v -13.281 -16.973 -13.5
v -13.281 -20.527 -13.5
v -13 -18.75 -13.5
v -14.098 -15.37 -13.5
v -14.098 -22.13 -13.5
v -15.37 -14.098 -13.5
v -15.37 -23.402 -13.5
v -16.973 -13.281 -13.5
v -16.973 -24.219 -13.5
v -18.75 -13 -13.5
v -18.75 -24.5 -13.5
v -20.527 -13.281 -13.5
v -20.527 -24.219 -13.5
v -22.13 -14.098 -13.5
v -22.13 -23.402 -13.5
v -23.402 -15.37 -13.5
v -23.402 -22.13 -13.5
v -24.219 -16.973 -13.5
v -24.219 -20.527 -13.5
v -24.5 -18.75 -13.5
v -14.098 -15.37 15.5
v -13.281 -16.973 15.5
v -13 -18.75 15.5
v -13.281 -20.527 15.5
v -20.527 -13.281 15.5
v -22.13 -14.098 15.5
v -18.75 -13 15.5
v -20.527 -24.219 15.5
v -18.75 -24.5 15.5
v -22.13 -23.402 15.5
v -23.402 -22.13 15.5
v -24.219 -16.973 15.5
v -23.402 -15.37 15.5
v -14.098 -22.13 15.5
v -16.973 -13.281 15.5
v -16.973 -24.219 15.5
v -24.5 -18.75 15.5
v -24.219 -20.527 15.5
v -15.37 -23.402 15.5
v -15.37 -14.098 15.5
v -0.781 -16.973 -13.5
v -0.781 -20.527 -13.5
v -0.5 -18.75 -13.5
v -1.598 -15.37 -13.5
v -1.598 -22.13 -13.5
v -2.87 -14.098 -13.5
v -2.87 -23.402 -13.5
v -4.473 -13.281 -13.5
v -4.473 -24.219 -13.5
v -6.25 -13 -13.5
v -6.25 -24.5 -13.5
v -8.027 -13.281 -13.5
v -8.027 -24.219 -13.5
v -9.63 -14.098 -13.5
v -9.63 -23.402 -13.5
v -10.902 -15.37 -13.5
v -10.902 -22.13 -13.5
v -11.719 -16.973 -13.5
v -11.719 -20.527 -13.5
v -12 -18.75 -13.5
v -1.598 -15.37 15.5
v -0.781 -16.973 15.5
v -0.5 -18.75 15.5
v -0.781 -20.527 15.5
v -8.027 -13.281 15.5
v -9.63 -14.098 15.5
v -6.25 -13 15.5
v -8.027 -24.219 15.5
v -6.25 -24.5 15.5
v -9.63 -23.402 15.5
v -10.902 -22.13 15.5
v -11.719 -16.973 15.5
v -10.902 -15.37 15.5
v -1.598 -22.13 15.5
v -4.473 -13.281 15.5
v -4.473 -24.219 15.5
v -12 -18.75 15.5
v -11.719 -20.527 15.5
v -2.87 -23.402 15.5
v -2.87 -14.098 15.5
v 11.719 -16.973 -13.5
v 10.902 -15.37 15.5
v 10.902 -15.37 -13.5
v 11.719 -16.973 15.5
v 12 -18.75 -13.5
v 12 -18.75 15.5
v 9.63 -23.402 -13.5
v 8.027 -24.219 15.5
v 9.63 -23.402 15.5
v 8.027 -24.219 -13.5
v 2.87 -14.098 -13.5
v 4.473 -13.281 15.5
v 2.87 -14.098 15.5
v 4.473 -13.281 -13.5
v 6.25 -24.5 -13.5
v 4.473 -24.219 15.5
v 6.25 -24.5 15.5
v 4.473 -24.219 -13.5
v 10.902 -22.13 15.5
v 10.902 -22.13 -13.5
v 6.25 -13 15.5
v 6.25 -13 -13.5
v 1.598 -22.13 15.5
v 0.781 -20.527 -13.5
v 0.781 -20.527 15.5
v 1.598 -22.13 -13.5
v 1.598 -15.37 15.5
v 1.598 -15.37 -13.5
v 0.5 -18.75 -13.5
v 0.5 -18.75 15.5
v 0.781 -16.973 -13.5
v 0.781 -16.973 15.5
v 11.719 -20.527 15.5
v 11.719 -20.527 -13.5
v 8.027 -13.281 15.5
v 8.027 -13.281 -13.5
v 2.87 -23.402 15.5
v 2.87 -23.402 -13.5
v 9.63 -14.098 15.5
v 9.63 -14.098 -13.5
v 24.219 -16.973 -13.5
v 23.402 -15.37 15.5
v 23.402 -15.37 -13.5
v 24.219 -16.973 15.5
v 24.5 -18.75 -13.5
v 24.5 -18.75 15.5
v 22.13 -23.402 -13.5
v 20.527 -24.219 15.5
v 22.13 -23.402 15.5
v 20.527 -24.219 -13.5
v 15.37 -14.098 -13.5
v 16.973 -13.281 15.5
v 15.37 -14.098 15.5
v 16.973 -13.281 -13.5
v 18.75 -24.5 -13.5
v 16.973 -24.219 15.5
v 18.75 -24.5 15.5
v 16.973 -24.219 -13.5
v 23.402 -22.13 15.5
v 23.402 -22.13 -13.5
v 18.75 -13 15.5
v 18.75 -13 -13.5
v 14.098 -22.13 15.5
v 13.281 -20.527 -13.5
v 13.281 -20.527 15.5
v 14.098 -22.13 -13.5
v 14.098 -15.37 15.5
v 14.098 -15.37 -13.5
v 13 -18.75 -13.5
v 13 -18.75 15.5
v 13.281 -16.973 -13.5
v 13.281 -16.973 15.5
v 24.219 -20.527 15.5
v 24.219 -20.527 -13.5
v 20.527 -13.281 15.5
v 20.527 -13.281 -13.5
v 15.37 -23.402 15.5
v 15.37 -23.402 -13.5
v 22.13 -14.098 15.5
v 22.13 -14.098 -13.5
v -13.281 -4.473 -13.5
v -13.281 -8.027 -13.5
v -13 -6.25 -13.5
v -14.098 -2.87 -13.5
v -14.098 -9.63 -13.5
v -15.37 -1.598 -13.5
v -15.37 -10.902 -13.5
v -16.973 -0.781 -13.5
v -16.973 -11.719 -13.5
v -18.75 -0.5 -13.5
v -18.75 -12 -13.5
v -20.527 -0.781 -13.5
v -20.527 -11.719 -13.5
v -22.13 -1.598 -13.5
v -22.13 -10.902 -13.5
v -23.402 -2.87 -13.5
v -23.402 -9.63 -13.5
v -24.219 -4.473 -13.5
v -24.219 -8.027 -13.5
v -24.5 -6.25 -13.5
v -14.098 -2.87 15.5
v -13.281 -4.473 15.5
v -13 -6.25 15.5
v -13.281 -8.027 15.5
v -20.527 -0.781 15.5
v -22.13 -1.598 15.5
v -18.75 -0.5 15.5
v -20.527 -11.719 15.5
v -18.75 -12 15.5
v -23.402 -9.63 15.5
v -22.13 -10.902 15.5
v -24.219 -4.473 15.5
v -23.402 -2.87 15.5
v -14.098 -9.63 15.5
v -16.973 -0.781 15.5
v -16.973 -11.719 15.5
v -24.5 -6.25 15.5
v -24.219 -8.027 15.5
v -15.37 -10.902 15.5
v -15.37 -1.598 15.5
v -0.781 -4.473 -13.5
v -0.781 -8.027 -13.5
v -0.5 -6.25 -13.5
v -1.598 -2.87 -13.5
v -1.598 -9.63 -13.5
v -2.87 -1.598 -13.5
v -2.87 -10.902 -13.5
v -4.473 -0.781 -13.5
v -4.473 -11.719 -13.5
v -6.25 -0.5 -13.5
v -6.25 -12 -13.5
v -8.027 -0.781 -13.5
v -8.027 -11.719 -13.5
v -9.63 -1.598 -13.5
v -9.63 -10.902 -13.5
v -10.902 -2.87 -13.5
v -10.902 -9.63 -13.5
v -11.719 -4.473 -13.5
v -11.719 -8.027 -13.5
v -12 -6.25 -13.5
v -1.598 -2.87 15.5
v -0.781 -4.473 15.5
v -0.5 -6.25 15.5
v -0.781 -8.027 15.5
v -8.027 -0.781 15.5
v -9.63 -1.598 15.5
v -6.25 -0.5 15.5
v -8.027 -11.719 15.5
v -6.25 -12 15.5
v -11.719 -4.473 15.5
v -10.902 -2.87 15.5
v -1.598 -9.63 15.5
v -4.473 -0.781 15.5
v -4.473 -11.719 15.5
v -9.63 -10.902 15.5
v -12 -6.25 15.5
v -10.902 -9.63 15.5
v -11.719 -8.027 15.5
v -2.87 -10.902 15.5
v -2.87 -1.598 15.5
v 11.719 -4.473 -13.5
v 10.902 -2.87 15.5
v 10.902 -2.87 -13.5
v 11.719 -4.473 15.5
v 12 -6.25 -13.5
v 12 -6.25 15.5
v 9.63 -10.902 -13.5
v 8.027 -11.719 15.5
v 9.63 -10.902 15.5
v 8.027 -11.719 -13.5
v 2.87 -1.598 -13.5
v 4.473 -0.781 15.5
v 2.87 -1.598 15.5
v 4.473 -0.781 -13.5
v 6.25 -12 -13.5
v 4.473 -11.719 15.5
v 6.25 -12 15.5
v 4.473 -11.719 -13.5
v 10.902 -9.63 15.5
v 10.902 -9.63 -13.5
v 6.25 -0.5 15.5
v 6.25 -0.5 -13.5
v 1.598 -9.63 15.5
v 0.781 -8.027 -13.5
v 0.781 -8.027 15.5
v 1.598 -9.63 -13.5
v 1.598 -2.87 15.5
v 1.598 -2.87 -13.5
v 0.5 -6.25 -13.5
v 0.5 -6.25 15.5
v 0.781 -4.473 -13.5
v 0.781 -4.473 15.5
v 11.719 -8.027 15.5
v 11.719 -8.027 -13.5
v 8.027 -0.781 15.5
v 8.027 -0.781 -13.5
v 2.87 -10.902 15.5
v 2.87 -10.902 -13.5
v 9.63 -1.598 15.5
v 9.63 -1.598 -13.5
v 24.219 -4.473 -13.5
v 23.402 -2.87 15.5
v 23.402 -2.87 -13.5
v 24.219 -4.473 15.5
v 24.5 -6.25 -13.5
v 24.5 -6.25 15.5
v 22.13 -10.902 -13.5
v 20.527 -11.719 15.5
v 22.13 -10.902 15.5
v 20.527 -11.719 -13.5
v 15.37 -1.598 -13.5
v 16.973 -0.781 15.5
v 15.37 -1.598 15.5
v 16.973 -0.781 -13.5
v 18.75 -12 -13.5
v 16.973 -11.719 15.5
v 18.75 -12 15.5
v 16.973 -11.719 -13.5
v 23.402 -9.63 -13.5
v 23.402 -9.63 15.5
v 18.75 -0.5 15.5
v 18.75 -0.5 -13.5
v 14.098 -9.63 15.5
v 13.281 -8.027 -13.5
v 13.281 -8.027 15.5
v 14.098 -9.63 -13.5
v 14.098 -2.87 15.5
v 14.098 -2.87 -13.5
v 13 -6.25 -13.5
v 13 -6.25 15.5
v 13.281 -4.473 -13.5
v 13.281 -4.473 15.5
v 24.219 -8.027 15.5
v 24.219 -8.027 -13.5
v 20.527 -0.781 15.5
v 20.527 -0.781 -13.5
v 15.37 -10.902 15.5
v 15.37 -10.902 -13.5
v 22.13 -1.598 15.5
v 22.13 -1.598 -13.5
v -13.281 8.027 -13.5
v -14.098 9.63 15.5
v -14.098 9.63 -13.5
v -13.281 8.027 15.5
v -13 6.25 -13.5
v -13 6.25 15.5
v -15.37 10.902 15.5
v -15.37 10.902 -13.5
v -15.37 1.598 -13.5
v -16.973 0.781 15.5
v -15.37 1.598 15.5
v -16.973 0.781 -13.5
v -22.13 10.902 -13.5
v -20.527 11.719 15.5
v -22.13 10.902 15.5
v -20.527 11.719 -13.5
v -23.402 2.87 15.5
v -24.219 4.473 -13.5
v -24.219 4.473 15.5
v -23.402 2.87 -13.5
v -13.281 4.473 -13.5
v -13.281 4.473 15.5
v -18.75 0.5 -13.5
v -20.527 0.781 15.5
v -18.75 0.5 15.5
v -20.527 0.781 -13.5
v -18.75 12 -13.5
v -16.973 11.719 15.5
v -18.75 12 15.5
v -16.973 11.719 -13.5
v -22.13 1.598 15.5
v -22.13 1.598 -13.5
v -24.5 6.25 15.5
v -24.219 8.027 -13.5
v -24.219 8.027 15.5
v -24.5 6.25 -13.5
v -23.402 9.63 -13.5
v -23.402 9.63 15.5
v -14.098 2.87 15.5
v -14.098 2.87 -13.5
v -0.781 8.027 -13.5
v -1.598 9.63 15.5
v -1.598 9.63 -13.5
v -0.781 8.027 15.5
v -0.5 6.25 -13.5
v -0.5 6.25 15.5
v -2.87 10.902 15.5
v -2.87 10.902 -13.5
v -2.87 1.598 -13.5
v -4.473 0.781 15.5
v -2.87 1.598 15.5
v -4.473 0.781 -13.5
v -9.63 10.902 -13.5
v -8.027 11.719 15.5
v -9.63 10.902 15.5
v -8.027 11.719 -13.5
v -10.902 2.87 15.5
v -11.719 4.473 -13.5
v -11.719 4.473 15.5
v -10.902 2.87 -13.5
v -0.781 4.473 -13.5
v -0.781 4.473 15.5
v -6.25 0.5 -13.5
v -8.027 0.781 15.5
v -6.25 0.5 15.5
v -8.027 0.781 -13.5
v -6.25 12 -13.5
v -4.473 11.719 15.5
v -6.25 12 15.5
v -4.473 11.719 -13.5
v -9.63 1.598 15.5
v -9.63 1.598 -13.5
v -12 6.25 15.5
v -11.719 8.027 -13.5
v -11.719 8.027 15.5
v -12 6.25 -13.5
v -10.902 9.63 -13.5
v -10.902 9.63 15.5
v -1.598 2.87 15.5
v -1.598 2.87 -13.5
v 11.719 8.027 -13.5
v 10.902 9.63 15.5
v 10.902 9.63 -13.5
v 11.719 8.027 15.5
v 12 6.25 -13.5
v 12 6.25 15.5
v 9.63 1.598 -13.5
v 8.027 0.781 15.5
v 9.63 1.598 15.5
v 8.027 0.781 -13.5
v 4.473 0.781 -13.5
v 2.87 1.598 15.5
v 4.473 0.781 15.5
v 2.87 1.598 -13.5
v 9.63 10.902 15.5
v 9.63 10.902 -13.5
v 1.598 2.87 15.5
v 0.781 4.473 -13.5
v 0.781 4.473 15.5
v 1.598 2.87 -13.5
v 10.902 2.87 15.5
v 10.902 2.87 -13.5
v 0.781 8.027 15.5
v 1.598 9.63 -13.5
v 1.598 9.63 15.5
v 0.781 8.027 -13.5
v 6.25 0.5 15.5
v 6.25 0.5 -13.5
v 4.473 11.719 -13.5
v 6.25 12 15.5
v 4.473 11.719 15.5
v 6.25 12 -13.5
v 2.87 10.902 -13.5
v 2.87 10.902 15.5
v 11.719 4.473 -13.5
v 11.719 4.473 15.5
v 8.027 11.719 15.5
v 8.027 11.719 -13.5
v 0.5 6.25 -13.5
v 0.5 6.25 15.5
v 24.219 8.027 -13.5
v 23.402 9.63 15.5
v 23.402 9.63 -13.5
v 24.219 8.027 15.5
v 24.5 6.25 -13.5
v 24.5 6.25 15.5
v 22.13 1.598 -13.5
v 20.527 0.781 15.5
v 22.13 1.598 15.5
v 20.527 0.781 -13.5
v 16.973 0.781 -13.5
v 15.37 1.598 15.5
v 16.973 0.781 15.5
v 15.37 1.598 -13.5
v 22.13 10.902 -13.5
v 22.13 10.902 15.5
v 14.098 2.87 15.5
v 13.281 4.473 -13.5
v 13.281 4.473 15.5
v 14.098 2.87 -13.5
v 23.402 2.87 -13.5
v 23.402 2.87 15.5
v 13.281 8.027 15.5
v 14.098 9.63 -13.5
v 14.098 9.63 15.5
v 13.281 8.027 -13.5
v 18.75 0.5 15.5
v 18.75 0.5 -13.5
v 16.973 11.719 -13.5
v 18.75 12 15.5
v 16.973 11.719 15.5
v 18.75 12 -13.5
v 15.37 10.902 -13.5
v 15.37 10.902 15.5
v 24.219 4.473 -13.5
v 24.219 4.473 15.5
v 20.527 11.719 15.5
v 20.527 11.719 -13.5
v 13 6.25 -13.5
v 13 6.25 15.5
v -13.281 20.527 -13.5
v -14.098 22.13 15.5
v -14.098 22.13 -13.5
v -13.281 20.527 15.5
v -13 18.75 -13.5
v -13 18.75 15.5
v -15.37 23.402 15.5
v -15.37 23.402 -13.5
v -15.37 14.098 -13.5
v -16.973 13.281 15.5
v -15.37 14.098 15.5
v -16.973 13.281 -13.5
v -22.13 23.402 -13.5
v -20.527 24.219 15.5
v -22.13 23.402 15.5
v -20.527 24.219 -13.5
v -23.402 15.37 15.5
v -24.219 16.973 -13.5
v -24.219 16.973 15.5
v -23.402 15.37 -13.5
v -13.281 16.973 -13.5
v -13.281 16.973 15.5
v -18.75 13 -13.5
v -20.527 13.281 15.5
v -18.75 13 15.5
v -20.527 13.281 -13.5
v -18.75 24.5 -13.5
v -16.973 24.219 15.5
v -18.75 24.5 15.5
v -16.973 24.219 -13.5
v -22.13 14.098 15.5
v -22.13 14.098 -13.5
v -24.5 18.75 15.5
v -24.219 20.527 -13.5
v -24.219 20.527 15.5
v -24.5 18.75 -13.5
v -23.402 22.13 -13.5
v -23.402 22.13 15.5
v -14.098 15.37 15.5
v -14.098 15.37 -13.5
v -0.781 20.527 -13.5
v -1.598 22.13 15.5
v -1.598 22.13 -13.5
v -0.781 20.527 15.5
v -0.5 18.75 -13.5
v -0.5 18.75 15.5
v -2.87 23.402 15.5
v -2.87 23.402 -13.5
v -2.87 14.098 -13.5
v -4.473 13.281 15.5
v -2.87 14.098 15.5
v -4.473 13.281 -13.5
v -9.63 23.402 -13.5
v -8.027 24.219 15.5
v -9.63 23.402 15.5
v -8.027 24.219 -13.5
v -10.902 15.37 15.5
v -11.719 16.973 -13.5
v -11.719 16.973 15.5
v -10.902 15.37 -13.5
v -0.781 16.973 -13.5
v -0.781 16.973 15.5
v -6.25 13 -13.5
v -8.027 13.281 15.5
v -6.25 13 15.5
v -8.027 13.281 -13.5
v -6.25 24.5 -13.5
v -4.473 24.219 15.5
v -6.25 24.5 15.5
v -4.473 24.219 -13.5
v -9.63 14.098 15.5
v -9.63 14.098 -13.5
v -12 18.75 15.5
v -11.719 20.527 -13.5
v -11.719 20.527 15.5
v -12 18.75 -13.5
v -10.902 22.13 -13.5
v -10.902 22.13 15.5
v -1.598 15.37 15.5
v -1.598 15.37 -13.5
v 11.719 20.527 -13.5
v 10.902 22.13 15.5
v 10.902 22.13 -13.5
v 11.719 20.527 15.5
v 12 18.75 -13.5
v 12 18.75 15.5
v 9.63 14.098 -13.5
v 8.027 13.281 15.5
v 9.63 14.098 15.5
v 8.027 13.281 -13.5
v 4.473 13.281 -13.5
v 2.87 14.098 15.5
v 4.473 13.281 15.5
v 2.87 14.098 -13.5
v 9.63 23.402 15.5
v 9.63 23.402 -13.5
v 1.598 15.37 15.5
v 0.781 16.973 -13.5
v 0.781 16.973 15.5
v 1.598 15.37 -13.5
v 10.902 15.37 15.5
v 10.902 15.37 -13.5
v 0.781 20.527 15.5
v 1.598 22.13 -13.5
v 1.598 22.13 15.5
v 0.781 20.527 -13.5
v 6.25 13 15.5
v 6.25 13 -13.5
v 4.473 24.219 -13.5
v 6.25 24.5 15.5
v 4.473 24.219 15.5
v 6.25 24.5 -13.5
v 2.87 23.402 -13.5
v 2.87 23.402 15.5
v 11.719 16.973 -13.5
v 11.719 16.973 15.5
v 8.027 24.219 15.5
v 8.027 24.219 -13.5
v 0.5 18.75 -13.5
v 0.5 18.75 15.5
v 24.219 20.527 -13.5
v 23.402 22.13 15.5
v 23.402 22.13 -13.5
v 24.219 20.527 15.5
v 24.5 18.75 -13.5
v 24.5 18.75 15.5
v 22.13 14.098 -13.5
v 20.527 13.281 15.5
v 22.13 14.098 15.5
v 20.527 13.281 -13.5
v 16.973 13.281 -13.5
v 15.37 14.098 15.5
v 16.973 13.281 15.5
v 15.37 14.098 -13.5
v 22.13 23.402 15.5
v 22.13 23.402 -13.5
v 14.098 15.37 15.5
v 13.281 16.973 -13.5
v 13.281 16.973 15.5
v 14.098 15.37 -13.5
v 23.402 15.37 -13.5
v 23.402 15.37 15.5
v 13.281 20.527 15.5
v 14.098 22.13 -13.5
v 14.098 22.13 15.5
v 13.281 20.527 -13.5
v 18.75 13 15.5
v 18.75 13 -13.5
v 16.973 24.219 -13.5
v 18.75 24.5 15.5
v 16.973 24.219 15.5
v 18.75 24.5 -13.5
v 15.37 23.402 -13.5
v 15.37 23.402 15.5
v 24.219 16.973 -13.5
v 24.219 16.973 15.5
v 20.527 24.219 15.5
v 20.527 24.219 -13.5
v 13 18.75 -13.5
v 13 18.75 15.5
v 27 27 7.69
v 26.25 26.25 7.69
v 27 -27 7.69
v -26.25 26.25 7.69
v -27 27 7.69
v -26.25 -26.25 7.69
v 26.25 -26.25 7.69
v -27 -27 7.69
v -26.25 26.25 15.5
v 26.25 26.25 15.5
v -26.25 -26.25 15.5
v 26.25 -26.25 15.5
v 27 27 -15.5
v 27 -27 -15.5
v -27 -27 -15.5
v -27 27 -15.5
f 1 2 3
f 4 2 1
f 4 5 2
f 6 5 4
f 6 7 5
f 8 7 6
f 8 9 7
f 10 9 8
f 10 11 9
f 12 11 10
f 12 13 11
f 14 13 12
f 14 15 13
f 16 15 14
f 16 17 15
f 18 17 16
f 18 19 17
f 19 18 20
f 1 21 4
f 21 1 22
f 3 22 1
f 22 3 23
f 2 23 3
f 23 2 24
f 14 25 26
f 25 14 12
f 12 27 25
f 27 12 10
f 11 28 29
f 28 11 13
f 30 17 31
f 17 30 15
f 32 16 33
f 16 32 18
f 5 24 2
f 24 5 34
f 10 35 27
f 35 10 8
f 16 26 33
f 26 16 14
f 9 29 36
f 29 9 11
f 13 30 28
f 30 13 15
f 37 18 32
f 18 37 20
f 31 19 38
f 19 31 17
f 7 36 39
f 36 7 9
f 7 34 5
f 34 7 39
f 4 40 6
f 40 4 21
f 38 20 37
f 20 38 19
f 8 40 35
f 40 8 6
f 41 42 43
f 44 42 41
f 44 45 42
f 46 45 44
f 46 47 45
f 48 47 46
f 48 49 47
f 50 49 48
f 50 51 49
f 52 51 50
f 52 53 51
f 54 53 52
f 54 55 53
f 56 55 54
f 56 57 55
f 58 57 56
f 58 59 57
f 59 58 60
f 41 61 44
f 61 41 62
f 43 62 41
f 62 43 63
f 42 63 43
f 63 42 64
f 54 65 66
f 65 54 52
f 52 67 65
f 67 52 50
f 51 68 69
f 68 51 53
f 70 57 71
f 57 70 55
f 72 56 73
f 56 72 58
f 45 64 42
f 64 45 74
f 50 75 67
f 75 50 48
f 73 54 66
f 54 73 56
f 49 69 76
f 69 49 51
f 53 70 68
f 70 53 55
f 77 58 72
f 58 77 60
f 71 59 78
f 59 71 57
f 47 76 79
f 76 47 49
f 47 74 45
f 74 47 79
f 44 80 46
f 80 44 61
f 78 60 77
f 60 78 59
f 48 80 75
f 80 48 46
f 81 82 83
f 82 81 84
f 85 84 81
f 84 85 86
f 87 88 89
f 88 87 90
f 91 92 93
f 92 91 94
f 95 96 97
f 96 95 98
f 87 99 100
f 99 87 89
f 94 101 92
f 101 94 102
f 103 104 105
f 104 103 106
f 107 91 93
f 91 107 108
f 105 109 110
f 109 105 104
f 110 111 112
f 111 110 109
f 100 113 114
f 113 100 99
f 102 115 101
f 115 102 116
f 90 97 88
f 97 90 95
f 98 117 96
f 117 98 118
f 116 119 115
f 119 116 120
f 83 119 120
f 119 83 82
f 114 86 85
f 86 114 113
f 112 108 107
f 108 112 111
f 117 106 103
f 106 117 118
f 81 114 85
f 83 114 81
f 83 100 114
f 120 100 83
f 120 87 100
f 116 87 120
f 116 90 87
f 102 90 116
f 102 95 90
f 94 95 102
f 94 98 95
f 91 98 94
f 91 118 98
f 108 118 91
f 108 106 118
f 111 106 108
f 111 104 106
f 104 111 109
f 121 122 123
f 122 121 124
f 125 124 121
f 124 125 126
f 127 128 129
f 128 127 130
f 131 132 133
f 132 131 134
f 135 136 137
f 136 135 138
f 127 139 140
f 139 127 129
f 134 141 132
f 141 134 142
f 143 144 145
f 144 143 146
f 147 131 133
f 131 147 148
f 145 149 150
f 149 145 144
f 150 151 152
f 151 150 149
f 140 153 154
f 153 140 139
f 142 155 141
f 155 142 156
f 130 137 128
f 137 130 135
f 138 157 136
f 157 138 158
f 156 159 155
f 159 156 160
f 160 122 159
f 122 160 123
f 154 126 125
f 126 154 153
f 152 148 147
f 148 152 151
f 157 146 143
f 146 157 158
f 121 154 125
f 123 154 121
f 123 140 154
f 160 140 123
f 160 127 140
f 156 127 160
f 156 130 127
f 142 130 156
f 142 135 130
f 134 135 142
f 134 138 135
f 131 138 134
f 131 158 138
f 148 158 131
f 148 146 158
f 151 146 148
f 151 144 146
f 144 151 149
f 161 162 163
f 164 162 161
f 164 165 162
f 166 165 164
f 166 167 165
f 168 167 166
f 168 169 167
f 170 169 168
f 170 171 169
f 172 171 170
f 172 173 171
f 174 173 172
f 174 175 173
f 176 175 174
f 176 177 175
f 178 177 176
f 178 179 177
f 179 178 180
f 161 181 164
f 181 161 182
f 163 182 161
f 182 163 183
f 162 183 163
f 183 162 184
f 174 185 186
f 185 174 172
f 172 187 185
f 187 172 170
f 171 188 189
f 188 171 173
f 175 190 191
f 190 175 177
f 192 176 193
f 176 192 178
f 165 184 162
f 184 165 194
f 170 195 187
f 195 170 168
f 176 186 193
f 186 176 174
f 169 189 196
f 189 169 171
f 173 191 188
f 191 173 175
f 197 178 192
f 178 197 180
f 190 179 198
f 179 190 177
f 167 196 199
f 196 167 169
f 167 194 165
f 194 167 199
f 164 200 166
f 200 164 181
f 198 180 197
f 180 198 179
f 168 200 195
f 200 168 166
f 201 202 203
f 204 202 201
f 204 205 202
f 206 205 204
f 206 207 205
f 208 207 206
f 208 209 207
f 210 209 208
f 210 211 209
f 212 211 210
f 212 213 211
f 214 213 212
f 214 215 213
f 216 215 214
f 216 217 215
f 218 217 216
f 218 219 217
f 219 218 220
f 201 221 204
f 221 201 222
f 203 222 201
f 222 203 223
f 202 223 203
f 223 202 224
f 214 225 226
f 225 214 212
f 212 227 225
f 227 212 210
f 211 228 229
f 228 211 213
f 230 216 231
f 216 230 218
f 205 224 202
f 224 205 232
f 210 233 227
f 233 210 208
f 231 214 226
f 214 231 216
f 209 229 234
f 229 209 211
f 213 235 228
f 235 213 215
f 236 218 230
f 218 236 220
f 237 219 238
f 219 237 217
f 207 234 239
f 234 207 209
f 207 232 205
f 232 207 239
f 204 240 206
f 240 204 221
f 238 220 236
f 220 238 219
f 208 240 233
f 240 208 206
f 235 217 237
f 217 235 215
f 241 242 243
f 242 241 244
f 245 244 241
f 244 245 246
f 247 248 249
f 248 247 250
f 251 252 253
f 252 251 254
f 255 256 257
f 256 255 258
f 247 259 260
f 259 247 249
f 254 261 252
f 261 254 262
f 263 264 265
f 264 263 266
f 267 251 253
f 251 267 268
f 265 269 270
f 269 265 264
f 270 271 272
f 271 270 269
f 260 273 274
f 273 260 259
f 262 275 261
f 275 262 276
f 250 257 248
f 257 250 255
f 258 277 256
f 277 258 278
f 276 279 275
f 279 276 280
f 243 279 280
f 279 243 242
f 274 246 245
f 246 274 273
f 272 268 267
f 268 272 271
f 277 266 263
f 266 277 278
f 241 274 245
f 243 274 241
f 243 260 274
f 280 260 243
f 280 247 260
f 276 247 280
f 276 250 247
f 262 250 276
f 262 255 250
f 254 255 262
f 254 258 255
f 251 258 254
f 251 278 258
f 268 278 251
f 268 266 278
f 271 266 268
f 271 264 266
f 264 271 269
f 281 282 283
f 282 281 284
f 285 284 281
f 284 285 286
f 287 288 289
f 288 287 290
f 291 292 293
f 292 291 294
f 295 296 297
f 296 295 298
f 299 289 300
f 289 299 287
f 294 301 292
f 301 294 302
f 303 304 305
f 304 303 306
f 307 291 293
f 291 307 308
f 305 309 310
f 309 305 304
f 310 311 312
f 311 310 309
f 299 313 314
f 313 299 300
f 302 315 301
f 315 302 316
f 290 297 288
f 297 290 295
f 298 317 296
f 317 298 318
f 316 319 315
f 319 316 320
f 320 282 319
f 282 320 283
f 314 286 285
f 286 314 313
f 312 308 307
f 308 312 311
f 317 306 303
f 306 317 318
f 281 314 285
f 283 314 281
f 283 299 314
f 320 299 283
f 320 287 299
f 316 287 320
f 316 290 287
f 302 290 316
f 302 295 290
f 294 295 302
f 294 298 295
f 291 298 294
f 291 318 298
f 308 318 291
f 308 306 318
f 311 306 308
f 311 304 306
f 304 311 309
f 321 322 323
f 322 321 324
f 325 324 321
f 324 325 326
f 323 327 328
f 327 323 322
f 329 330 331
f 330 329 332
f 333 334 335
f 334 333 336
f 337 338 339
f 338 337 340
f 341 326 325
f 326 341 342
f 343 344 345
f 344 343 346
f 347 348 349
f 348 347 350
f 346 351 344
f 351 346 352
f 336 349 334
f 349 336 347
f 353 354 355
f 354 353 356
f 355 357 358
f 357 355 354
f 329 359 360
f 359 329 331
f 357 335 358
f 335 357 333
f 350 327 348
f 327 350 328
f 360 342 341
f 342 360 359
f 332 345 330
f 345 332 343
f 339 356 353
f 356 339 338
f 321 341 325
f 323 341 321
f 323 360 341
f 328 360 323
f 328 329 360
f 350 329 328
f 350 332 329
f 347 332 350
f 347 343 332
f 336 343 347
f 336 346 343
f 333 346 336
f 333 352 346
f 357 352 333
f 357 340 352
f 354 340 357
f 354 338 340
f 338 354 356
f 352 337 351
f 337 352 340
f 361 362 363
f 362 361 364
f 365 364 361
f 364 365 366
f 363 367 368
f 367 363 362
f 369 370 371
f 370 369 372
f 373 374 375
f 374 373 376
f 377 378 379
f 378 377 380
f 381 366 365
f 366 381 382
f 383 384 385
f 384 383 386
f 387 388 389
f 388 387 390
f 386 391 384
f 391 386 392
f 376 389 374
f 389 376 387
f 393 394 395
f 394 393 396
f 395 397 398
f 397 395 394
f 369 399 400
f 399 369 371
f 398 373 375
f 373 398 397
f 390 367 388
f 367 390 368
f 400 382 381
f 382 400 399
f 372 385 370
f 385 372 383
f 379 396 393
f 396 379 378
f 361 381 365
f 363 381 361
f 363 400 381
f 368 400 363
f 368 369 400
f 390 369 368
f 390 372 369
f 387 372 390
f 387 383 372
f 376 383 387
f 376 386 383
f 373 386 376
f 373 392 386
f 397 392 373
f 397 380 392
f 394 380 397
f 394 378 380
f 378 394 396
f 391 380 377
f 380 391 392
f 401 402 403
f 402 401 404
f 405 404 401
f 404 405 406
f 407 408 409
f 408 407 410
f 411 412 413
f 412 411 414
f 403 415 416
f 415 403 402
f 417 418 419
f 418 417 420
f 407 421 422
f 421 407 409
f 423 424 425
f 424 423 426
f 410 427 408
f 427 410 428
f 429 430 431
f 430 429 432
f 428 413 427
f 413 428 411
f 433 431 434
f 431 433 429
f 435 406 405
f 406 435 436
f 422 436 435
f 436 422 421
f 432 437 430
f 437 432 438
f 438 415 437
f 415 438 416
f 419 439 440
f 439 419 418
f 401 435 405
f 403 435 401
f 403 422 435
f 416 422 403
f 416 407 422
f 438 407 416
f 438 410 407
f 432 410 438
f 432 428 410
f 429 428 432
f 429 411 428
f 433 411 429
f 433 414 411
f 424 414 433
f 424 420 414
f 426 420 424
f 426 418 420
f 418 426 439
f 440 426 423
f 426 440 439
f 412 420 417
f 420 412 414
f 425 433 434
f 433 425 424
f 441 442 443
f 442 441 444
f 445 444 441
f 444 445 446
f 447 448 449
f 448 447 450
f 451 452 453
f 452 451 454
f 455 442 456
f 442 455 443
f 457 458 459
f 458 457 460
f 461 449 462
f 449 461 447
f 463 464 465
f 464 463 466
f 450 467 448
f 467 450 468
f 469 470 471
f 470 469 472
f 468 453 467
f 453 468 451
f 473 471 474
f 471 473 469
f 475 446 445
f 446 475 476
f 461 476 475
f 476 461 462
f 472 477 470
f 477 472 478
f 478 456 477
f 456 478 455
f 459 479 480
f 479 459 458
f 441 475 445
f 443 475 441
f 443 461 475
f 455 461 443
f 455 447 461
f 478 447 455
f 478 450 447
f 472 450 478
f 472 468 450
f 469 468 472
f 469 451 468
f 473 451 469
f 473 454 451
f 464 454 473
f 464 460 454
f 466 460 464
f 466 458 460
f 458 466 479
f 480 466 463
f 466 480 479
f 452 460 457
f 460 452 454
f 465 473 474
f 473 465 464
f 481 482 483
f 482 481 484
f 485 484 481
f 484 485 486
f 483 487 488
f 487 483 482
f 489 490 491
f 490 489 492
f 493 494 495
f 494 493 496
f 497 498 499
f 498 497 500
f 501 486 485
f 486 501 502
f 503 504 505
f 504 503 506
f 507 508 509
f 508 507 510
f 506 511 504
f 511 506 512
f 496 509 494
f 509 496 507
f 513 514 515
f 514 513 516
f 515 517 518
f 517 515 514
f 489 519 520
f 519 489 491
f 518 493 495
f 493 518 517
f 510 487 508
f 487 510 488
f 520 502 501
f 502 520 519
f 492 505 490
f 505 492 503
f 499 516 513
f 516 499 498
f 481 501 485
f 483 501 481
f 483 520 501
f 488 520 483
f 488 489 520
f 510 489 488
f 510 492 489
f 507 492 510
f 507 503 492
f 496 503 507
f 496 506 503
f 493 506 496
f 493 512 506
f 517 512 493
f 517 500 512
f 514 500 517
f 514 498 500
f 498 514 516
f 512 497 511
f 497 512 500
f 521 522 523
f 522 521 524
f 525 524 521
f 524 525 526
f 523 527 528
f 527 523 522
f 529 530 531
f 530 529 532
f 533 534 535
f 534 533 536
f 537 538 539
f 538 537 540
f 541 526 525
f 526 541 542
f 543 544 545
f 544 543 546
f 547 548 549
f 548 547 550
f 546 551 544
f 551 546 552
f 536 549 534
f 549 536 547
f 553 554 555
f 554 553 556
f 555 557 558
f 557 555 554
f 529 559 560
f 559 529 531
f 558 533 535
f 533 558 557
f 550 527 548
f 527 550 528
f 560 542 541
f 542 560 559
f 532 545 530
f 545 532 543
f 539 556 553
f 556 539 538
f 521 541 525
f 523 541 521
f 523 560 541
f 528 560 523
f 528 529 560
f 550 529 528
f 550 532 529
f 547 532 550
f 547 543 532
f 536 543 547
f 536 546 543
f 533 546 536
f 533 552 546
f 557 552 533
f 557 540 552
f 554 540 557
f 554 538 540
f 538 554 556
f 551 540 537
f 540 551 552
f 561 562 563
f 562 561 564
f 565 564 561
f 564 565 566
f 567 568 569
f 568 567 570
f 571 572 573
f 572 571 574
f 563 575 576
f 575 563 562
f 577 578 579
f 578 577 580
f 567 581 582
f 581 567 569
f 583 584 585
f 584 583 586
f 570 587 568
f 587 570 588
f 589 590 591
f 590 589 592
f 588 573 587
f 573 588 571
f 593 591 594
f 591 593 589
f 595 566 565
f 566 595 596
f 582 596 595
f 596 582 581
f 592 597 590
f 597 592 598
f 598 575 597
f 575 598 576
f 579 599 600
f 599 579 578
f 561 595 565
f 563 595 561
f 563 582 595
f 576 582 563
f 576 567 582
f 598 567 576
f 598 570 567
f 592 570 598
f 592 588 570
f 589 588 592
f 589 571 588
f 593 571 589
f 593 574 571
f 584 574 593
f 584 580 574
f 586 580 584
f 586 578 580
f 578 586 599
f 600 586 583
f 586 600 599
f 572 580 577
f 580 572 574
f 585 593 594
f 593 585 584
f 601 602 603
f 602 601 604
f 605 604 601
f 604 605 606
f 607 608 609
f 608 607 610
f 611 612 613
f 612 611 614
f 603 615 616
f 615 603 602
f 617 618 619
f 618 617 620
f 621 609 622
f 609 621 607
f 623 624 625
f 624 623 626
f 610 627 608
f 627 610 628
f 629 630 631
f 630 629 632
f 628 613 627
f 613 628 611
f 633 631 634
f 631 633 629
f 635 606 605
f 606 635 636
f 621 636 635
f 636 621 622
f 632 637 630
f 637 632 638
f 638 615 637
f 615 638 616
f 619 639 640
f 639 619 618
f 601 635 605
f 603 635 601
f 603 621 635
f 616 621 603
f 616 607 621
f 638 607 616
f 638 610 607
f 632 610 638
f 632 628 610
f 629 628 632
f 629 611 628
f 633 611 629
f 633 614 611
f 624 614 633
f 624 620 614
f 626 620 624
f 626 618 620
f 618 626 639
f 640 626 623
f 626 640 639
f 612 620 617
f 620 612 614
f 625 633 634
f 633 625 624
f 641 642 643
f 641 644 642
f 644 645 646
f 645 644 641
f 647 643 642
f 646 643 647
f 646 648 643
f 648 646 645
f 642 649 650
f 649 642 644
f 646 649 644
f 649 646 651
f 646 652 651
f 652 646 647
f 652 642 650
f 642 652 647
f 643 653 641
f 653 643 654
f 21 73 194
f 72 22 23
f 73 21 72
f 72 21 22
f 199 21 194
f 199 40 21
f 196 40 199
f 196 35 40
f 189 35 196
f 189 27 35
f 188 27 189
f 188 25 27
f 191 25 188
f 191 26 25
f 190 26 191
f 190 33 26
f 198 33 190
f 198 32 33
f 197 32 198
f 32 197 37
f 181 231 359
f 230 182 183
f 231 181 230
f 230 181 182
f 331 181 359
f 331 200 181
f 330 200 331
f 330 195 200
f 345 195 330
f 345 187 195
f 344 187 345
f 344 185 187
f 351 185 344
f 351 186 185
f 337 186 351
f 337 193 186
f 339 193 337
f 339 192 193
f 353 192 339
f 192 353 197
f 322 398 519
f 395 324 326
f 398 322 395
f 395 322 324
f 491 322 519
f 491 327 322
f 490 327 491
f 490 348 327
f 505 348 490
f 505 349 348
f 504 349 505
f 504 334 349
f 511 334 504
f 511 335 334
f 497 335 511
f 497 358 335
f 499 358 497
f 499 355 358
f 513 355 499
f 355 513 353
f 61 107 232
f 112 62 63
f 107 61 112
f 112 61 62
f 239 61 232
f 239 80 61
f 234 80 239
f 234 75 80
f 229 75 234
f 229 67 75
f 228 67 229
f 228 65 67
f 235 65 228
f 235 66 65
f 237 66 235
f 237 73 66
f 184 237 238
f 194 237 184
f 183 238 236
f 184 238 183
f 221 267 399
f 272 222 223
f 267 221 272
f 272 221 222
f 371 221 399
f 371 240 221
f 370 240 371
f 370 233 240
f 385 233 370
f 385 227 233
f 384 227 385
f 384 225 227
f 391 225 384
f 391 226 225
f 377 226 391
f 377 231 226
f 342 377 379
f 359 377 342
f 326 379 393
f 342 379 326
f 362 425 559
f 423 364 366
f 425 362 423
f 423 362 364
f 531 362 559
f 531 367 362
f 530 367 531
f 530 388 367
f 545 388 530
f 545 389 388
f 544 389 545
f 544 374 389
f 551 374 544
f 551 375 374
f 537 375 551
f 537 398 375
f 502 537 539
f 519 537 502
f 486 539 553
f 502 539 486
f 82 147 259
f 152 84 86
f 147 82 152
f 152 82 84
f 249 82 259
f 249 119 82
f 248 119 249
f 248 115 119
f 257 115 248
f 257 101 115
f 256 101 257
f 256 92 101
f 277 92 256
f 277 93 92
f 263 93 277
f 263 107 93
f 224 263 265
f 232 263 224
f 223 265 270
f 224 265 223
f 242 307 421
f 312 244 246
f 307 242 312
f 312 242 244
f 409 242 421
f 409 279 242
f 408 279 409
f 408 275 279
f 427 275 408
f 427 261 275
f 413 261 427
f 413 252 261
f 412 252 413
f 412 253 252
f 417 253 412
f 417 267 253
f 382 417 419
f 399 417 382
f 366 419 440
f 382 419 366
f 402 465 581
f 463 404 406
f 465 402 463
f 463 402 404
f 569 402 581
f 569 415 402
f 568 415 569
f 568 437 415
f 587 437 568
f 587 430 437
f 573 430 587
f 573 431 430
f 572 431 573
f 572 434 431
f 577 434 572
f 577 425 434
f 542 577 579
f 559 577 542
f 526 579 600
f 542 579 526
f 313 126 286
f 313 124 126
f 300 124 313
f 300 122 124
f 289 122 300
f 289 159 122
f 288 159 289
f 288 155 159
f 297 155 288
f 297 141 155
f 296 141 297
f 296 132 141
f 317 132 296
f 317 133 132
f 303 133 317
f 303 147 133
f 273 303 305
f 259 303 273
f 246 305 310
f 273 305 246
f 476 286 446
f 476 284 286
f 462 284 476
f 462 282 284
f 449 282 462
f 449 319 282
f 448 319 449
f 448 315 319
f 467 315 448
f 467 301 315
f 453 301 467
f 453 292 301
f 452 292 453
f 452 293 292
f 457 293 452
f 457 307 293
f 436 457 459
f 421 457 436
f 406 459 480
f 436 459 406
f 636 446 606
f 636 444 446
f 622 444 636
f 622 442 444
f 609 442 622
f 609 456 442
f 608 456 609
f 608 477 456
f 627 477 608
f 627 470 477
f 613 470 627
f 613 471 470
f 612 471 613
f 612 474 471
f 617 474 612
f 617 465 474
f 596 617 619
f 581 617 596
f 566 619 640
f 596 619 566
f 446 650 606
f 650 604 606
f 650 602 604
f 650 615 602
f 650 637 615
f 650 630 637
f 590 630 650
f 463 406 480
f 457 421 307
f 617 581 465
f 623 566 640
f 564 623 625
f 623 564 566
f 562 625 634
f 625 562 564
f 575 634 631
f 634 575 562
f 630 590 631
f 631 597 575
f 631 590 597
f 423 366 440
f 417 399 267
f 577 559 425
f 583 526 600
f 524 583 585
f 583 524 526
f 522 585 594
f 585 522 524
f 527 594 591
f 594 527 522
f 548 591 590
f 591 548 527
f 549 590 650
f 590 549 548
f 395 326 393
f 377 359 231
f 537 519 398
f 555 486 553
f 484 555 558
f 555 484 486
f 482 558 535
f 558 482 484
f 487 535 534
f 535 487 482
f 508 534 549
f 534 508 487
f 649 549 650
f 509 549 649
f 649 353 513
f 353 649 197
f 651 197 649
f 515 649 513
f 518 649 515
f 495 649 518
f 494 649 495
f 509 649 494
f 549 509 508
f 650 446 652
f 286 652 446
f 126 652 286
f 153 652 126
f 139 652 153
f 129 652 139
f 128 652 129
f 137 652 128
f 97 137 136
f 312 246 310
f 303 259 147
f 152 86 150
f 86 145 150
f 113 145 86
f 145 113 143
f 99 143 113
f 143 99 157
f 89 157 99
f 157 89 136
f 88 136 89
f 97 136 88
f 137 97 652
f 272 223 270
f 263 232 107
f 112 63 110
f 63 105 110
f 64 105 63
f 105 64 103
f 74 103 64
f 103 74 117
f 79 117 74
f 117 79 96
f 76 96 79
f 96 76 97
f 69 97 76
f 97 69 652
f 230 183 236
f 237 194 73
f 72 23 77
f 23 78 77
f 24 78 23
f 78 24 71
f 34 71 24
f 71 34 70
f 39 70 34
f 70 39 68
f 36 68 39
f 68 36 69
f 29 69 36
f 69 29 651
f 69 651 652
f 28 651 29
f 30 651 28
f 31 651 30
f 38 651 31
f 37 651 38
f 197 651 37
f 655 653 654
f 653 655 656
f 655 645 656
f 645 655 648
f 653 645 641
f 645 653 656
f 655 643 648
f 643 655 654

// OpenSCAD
height=31;		//box height
diam=11.5;		//battery diameter 
rows=4;
spacing=1;
width=(diam+spacing)*rows+4;


   difference()
  {
			 intersection()
      {
			cube([width,width,height], center = true);
		}

for ( j = [(-width/2)+(width-rows*(diam+spacing))/2+(diam+spacing)/2: diam+spacing : ((width/2))] )
	{
		for ( i = [(-width/2)+(width-rows*(diam+spacing))/2+(diam+spacing)/2 : diam+spacing : ((width/2))] )
		{
			translate([i , j, 2]) cylinder(h = height, r = diam/2, center = true, $fn=20 );
		}
	}
		for ( k = [0 : 3] )
		{
			 rotate([0, 0, k * 90])
				translate([width/2 , width/2, height/2-8/2.1])cube([width*2,1.5,8], center = true);
		}
}
